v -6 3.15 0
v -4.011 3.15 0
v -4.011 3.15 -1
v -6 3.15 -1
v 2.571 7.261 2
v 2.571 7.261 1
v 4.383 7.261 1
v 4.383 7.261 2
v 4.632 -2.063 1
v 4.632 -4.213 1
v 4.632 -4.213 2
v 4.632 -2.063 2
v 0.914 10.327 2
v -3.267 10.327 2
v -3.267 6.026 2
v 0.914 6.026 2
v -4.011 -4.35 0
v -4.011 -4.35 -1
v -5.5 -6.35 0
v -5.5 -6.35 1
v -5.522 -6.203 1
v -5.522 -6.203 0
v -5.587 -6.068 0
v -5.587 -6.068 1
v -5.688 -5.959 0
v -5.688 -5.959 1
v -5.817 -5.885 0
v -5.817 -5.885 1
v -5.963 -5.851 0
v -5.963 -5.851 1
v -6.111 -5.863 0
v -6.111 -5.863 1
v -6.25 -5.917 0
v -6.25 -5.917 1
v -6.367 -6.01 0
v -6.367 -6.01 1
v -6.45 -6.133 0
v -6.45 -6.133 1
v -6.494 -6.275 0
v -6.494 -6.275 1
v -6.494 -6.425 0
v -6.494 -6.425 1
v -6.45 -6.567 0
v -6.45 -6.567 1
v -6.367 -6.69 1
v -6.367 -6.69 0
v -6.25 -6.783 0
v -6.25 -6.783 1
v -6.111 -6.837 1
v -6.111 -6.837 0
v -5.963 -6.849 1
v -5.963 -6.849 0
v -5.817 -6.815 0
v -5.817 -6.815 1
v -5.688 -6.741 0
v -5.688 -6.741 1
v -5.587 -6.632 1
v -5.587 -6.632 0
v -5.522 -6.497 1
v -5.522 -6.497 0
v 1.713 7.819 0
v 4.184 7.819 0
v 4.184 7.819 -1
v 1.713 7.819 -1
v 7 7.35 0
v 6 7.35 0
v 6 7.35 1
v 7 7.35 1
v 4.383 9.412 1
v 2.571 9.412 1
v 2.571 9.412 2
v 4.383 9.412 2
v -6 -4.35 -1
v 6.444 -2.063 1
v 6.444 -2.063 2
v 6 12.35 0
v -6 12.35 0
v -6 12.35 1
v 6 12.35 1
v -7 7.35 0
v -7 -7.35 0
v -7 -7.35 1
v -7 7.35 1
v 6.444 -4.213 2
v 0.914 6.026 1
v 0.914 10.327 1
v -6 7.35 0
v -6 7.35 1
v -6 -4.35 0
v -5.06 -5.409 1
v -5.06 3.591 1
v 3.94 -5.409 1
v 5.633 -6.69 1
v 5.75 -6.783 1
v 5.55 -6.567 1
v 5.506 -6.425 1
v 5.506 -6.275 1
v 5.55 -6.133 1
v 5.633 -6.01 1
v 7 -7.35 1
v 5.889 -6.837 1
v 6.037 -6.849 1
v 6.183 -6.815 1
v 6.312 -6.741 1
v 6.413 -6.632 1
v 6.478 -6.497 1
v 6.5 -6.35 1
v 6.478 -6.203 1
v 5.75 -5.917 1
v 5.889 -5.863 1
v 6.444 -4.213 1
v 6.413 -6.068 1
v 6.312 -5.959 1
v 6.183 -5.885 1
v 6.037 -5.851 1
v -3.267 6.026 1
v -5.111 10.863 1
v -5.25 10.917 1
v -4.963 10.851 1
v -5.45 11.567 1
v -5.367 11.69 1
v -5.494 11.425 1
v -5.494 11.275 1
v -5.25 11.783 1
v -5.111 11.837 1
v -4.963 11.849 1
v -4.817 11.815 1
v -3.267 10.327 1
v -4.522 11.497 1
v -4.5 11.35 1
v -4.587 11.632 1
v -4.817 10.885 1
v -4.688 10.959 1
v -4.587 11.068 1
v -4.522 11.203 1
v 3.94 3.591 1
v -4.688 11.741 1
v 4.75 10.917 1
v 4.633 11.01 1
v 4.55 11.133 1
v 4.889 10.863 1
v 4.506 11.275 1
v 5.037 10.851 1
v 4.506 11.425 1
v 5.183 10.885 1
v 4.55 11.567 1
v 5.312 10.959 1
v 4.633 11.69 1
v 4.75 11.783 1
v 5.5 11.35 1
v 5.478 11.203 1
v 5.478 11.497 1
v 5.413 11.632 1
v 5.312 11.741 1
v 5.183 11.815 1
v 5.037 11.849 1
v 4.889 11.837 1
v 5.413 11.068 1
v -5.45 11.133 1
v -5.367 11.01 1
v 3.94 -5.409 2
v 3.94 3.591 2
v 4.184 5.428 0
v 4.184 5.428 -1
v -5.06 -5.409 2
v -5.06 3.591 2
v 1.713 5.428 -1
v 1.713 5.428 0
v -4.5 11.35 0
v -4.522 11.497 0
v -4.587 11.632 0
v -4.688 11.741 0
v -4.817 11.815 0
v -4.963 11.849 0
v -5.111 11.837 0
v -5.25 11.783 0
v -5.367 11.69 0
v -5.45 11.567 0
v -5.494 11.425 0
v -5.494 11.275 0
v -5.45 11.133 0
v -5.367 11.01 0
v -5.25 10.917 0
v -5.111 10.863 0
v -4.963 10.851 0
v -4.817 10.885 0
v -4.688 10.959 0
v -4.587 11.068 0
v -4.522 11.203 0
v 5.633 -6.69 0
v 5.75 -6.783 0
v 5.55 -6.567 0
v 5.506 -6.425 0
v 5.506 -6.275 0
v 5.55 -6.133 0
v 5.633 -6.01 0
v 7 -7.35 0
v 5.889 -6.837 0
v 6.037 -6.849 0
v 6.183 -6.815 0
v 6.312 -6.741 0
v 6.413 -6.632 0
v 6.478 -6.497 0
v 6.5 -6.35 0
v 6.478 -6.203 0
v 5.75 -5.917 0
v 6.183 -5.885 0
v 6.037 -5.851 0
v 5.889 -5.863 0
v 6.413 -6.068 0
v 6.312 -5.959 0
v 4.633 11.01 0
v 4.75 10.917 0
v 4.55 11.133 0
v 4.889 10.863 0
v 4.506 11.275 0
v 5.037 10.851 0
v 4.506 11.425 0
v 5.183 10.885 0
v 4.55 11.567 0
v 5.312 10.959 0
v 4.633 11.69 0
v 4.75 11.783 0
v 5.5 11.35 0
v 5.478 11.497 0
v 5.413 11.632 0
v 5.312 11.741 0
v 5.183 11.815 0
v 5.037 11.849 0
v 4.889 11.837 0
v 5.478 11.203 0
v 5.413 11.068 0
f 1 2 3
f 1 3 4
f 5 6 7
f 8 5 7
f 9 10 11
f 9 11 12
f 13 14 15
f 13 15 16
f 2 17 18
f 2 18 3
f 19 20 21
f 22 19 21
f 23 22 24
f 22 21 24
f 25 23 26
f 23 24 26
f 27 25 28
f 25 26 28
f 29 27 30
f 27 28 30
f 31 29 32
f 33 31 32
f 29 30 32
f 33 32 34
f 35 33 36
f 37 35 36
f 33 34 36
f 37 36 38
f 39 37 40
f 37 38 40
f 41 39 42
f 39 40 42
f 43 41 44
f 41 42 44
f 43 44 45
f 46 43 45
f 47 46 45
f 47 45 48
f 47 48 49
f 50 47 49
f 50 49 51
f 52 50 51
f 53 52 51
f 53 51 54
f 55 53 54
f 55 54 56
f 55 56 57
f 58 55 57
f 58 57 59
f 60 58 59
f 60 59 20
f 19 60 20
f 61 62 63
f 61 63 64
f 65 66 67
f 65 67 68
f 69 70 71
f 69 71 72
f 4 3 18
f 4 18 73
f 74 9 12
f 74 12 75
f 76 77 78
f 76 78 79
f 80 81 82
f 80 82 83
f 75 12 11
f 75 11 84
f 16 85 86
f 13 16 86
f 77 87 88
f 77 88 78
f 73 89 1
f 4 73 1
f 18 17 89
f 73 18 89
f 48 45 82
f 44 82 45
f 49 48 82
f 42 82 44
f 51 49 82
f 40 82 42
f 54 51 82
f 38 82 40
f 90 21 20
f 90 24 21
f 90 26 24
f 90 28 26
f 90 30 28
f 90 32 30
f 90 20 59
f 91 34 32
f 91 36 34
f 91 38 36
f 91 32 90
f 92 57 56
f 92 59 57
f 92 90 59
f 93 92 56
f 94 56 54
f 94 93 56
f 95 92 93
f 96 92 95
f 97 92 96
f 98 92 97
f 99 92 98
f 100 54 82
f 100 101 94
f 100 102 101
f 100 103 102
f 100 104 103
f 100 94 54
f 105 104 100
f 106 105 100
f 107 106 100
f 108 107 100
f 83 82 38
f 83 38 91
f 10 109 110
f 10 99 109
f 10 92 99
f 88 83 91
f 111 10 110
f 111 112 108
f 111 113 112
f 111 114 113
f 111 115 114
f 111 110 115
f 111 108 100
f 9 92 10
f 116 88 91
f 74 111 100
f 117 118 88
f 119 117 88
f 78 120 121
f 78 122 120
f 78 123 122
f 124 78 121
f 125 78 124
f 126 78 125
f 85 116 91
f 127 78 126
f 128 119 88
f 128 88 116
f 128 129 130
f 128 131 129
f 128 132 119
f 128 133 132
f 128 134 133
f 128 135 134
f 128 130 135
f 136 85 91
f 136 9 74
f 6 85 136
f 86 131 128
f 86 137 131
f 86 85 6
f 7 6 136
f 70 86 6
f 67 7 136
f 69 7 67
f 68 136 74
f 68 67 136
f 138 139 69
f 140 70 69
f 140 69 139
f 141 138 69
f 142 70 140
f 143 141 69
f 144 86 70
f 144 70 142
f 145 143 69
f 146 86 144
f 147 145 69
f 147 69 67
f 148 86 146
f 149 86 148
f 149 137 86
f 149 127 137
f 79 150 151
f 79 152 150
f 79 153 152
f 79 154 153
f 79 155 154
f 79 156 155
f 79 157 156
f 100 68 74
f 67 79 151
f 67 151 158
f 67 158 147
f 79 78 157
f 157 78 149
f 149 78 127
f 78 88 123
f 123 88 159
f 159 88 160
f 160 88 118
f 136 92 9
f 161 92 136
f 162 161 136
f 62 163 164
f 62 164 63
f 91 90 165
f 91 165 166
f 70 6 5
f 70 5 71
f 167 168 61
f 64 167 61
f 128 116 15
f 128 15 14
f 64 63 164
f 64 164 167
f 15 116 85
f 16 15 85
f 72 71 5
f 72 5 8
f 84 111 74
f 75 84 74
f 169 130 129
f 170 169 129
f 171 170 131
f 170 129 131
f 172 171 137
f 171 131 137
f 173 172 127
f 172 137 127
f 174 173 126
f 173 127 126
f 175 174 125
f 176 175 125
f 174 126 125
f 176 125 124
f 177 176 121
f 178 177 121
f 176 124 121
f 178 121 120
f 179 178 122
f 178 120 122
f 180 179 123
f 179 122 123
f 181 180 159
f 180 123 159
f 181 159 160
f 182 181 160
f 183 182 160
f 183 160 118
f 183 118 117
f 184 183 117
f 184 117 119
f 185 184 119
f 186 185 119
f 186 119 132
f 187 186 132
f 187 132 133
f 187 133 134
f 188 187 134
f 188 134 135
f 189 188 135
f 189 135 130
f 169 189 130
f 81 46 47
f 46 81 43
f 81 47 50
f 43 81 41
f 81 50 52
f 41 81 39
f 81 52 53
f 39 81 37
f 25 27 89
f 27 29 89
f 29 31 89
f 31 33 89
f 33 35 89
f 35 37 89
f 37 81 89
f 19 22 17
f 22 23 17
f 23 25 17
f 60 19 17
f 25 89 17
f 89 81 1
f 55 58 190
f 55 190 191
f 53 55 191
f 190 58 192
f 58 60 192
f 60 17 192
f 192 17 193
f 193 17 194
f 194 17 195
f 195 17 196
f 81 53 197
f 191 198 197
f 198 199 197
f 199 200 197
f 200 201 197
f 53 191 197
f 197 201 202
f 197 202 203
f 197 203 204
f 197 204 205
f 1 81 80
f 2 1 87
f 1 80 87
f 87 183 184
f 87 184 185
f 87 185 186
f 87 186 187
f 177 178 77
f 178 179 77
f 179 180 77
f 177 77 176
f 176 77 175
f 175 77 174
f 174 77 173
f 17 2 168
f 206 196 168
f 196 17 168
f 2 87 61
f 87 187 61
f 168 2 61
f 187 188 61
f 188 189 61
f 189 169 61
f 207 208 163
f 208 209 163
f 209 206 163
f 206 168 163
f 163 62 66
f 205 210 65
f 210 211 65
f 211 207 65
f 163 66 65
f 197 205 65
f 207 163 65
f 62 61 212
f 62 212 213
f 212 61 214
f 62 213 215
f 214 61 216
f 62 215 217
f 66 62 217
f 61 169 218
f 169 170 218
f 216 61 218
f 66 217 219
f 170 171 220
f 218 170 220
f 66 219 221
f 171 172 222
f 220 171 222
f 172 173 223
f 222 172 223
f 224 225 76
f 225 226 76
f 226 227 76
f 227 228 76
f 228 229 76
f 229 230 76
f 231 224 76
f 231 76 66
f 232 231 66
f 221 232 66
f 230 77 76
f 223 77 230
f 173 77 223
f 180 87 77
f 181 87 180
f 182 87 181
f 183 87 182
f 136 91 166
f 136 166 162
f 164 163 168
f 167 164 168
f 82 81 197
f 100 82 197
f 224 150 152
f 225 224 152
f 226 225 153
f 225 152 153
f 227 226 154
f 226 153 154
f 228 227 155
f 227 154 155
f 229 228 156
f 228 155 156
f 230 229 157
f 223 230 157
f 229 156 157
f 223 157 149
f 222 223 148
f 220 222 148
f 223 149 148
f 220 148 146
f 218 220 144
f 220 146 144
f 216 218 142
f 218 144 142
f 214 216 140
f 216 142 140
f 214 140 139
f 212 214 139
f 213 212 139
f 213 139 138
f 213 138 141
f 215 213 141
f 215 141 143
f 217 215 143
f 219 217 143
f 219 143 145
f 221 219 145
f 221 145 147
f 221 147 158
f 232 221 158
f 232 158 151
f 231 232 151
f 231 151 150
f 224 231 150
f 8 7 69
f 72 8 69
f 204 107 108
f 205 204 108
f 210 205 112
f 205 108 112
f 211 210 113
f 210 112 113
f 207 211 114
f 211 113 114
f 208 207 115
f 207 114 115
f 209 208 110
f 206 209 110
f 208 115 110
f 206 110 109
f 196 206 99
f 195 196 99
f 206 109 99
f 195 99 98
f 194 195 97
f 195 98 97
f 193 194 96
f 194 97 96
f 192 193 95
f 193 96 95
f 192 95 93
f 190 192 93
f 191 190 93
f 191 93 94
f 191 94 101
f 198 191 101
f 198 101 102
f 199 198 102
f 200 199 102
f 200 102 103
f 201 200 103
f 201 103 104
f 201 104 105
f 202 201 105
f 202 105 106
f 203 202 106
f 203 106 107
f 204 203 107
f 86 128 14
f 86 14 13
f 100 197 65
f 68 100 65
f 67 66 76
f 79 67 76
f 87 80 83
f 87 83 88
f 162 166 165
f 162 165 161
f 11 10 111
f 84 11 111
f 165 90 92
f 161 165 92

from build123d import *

# Parameters (mm, degrees)
SKETCH_1_W          = 14
SKETCH_1_H          = 14.7
EXTRUDE_1_DEPTH     = 1
SKETCH_2_W          = 12
SKETCH_2_H          = 5
EXTRUDE_2_DEPTH     = 1
SKETCH_3_R          = 0.5
CUT_EXTRUDE_1_DEPTH = 2
SKETCH_4_W          = 4.181251824
SKETCH_4_H          = 4.30078239
SKETCH_4_W_2        = 9
SKETCH_4_H_2        = 9
SKETCH_4_W_3        = 1.811721258
SKETCH_4_H_3        = 2.150391195
EXTRUDE_3_DEPTH     = 1
SKETCH_5_W          = 1.98908545
SKETCH_5_H          = 7.5
SKETCH_5_W_2        = 2.470298365
SKETCH_5_H_2        = 2.390611322
EXTRUDE_4_DEPTH     = 1


with BuildPart() as part:
    # 草图1 → 凸台-拉伸1 (new body)
    with BuildSketch(Plane.XY):
        Rectangle(SKETCH_1_W, SKETCH_1_H)
    extrude(amount=EXTRUDE_1_DEPTH)

    # 草图2 → 凸台-拉伸2 (add)
    with BuildSketch(Plane.XY):
        with Locations((0, 9.85)):
            Rectangle(SKETCH_2_W, SKETCH_2_H)
    extrude(amount=EXTRUDE_2_DEPTH)

    # 草图3 → 切除-拉伸1 (cut, through all)
    with BuildSketch(Plane.XY.offset(1)):
        with Locations((-5, 11.35)):
            Circle(SKETCH_3_R)
        with Locations((5, 11.35)):
            Circle(SKETCH_3_R)
        with Locations((-6, -6.35)):
            Circle(SKETCH_3_R)
        with Locations((6, -6.35)):
            Circle(SKETCH_3_R)
    extrude(amount=-CUT_EXTRUDE_1_DEPTH, mode=Mode.SUBTRACT)

    # 草图4 → 凸台-拉伸3 (add)
    with BuildSketch(Plane.XY.offset(1)):
        with Locations((-1.176542894, 8.176542894)):
            Rectangle(SKETCH_4_W, SKETCH_4_H)
        with Locations((-0.560127297, -0.908939121)):
            Rectangle(SKETCH_4_W_2, SKETCH_4_H_2)
        with Locations((3.476926793, 8.336496479)):
            Rectangle(SKETCH_4_W_3, SKETCH_4_H_3)
        with Locations((5.538249561, -3.137858366)):
            Rectangle(SKETCH_4_W_3, SKETCH_4_H_3)
    extrude(amount=EXTRUDE_3_DEPTH)

    # 草图5 → 凸台-拉伸4 (add)
    with BuildSketch(Plane(origin=(0, 0, 0), x_dir=(-1, 0, 0), z_dir=(0, 0, -1))):
        with Locations((5.005457275, -0.6)):
            Rectangle(SKETCH_5_W, SKETCH_5_H)
        with Locations((-2.94842063, 6.623804529)):
            Rectangle(SKETCH_5_W_2, SKETCH_5_H_2)
    extrude(amount=EXTRUDE_4_DEPTH)


solid = part.part
